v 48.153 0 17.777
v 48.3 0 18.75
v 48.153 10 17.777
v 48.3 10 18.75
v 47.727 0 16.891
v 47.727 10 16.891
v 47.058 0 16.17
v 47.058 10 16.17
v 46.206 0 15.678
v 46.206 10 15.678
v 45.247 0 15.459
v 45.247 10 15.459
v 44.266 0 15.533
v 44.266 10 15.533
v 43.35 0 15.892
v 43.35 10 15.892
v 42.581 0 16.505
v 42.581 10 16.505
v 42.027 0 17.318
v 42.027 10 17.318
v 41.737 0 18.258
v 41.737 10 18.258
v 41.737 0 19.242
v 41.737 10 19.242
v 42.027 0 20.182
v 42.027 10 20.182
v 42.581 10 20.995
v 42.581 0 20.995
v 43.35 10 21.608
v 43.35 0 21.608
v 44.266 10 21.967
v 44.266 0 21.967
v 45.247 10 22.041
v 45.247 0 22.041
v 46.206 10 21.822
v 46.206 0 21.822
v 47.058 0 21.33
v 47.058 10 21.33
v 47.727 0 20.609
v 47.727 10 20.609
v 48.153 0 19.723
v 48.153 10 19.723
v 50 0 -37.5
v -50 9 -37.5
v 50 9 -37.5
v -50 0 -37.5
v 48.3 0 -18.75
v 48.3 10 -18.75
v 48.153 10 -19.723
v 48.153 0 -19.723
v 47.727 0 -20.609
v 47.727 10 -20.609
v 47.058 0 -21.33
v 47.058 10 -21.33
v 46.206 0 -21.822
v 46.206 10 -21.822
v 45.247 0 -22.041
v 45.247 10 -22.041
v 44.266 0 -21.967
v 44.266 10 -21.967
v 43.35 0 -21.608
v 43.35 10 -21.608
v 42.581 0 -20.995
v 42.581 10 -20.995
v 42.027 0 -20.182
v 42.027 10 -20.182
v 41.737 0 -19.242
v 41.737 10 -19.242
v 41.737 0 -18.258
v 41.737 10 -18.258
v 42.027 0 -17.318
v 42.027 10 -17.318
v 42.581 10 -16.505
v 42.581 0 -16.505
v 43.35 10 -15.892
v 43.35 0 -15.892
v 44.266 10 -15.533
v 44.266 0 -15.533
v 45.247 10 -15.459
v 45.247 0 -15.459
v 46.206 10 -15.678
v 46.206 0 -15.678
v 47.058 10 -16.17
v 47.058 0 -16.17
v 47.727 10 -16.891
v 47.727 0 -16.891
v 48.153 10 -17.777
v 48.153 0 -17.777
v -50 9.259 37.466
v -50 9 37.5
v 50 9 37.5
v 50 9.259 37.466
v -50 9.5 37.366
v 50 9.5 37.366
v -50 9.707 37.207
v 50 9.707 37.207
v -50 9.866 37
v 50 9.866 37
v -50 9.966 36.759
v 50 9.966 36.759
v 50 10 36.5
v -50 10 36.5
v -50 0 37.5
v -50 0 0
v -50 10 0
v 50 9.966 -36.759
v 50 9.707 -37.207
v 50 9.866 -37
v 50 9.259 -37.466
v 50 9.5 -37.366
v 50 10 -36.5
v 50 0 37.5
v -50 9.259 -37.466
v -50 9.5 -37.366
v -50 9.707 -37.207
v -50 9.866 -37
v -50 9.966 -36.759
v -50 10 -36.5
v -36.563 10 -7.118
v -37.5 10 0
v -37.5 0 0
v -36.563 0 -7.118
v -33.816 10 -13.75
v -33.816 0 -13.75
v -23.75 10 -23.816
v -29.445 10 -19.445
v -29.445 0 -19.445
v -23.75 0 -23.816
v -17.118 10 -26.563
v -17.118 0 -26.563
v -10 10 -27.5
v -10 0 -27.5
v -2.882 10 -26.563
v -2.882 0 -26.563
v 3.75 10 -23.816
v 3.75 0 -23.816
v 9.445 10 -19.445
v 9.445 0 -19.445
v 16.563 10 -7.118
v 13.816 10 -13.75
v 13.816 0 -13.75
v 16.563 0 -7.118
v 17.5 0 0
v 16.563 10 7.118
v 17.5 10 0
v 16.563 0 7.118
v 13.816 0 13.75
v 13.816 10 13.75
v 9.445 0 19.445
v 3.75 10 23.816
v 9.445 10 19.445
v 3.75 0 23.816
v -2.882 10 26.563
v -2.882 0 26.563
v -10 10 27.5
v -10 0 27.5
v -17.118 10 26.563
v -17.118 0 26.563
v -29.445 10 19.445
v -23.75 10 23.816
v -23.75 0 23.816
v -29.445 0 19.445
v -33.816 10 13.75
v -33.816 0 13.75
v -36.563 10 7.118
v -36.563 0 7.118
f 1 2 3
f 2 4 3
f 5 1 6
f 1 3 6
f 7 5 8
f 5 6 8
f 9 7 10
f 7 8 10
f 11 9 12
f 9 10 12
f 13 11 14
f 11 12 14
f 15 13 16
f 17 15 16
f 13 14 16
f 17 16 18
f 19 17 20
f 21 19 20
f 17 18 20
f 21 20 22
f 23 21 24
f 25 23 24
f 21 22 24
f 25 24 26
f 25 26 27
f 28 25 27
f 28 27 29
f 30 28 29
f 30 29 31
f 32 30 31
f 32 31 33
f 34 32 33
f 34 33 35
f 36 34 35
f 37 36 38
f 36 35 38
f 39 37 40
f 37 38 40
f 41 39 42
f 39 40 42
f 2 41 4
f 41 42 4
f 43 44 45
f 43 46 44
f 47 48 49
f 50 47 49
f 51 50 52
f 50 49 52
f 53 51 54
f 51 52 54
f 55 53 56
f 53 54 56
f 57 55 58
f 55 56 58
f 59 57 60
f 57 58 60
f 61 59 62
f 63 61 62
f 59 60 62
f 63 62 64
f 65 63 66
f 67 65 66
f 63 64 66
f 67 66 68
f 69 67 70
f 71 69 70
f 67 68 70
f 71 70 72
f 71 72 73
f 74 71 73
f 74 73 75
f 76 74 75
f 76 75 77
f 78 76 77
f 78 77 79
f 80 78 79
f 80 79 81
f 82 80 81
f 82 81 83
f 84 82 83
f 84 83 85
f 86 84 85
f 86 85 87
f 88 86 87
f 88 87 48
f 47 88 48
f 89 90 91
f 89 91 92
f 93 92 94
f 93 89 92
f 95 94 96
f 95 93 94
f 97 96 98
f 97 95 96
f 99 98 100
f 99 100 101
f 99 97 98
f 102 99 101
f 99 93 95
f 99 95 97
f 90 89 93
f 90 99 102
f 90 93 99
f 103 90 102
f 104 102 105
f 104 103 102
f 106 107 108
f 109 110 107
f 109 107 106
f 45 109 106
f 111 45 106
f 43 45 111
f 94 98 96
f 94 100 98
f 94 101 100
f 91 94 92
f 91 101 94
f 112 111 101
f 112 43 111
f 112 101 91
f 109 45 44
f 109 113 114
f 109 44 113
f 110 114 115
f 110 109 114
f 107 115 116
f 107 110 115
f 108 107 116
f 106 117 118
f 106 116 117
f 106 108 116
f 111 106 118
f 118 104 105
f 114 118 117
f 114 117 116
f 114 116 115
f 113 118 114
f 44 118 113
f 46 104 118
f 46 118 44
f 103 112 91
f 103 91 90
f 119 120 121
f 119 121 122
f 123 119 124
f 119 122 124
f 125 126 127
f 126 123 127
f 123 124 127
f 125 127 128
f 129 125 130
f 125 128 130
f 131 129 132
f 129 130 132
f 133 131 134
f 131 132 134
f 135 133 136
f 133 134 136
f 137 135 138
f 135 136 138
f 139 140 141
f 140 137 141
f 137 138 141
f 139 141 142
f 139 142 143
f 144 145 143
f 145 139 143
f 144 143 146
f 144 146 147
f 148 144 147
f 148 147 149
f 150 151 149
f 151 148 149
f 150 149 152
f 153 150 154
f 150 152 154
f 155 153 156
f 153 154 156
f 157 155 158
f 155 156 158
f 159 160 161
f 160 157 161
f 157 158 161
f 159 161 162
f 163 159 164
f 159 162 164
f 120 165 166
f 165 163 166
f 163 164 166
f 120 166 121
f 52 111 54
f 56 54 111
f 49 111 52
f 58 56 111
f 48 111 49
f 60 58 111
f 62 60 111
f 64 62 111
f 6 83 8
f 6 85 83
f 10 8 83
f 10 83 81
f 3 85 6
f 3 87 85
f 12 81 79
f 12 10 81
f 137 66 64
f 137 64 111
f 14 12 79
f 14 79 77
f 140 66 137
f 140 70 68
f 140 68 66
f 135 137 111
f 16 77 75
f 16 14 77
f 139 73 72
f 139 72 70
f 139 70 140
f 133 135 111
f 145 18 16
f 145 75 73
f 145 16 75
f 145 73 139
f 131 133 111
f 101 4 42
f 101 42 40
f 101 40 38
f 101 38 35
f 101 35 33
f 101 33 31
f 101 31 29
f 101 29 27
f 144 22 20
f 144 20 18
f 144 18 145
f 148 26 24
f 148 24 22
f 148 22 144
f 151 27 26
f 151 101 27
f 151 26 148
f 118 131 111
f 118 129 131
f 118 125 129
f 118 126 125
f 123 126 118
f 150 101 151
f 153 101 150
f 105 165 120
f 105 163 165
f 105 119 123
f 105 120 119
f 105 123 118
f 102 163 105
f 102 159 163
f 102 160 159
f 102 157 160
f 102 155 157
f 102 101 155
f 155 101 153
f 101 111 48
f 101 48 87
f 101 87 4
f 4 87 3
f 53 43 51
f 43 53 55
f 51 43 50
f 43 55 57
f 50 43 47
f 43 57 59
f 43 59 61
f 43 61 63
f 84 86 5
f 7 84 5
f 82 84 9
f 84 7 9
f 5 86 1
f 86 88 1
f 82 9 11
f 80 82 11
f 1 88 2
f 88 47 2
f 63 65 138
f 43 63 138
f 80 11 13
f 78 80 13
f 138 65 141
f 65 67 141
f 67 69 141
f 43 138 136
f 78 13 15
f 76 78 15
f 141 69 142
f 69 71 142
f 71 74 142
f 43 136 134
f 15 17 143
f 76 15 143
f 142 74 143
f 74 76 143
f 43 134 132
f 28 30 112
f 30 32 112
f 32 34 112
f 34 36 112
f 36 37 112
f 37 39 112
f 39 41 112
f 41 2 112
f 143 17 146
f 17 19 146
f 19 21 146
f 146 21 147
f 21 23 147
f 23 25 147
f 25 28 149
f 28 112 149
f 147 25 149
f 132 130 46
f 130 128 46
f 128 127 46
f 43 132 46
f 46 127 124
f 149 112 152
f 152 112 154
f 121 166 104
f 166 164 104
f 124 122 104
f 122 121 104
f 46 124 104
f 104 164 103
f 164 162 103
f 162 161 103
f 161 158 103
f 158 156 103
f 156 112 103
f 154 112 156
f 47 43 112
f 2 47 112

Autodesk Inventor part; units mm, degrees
ref_plane "YZ Plane" through (0, 0, 0) normal (1, 0, 0) x (0, 1, 0)
ref_plane "XZ Plane" through (0, 0, 0) normal (0, 1, 0) x (-1, 0, 0)
ref_plane "XY Plane" through (0, 0, 0) normal (0, 0, 1) x (1, 0, 0)
sketch "Sketch1" plane through (0, 0, 0) normal (0, 1, 0) x (-1, 0, 0)
  line L0 (-50, 37.5) -> (50, 37.5)
  line L1 (50, 37.5) -> (50, -37.5)
  line L2 (50, -37.5) -> (-50, -37.5)
  line L3 (-50, -37.5) -> (-50, 37.5)
  line L4 (-50, 37.5) -> (50, -37.5) construction
  line L5 (50, 37.5) -> (-50, -37.5) construction
  line L6 (50, 0) -> (10, 0)
  circle A0 centre (10, 0) radius 27.5
  point P0 (0, 0)
  dimension "d0" = 100
  dimension "d1" = 75
  dimension "d2" = 40
  dimension "d3" = 55
extrude "Extrusion1" add sketch "Sketch1" along normal blind 10
sketch "Sketch2" plane through (0, 10, 0) normal (0, 1, 0) x (1, 0, 0)
  line L0 (50, 37.5) -> (-50, 37.5) projected
  line L1 (-50, -37.5) -> (50, -37.5) projected
  line L2 (50, 37.5) -> (40, 37.5)
  line L3 (40, 37.5) -> (40, -37.5)
  line L4 (40, -37.5) -> (50, -37.5)
  line L5 (50, -37.5) -> (50, 37.5)
  line L6 (45, 37.5) -> (45, 0)
  line L7 (45, 0) -> (45, -37.5)
  circle A0 centre (45, 18.75) radius 3.3
  circle A1 centre (45, -18.75) radius 3.3
  point P0 (0, 0)
  dimension "d6" = 10
  dimension "d7" = 6.6
  dimension "d8" = 6.6
extrude "Extrusion2" cut sketch "Sketch2" against normal up to surface (10 mm away) contours A0 L6 | L6 A0 | A1 L7 | L7 A1
fillet "Fillet1" radius 1 2 edges at (0, 10, 37.5) (0, 10, -37.5)
properties part number "blok_łożyska"
